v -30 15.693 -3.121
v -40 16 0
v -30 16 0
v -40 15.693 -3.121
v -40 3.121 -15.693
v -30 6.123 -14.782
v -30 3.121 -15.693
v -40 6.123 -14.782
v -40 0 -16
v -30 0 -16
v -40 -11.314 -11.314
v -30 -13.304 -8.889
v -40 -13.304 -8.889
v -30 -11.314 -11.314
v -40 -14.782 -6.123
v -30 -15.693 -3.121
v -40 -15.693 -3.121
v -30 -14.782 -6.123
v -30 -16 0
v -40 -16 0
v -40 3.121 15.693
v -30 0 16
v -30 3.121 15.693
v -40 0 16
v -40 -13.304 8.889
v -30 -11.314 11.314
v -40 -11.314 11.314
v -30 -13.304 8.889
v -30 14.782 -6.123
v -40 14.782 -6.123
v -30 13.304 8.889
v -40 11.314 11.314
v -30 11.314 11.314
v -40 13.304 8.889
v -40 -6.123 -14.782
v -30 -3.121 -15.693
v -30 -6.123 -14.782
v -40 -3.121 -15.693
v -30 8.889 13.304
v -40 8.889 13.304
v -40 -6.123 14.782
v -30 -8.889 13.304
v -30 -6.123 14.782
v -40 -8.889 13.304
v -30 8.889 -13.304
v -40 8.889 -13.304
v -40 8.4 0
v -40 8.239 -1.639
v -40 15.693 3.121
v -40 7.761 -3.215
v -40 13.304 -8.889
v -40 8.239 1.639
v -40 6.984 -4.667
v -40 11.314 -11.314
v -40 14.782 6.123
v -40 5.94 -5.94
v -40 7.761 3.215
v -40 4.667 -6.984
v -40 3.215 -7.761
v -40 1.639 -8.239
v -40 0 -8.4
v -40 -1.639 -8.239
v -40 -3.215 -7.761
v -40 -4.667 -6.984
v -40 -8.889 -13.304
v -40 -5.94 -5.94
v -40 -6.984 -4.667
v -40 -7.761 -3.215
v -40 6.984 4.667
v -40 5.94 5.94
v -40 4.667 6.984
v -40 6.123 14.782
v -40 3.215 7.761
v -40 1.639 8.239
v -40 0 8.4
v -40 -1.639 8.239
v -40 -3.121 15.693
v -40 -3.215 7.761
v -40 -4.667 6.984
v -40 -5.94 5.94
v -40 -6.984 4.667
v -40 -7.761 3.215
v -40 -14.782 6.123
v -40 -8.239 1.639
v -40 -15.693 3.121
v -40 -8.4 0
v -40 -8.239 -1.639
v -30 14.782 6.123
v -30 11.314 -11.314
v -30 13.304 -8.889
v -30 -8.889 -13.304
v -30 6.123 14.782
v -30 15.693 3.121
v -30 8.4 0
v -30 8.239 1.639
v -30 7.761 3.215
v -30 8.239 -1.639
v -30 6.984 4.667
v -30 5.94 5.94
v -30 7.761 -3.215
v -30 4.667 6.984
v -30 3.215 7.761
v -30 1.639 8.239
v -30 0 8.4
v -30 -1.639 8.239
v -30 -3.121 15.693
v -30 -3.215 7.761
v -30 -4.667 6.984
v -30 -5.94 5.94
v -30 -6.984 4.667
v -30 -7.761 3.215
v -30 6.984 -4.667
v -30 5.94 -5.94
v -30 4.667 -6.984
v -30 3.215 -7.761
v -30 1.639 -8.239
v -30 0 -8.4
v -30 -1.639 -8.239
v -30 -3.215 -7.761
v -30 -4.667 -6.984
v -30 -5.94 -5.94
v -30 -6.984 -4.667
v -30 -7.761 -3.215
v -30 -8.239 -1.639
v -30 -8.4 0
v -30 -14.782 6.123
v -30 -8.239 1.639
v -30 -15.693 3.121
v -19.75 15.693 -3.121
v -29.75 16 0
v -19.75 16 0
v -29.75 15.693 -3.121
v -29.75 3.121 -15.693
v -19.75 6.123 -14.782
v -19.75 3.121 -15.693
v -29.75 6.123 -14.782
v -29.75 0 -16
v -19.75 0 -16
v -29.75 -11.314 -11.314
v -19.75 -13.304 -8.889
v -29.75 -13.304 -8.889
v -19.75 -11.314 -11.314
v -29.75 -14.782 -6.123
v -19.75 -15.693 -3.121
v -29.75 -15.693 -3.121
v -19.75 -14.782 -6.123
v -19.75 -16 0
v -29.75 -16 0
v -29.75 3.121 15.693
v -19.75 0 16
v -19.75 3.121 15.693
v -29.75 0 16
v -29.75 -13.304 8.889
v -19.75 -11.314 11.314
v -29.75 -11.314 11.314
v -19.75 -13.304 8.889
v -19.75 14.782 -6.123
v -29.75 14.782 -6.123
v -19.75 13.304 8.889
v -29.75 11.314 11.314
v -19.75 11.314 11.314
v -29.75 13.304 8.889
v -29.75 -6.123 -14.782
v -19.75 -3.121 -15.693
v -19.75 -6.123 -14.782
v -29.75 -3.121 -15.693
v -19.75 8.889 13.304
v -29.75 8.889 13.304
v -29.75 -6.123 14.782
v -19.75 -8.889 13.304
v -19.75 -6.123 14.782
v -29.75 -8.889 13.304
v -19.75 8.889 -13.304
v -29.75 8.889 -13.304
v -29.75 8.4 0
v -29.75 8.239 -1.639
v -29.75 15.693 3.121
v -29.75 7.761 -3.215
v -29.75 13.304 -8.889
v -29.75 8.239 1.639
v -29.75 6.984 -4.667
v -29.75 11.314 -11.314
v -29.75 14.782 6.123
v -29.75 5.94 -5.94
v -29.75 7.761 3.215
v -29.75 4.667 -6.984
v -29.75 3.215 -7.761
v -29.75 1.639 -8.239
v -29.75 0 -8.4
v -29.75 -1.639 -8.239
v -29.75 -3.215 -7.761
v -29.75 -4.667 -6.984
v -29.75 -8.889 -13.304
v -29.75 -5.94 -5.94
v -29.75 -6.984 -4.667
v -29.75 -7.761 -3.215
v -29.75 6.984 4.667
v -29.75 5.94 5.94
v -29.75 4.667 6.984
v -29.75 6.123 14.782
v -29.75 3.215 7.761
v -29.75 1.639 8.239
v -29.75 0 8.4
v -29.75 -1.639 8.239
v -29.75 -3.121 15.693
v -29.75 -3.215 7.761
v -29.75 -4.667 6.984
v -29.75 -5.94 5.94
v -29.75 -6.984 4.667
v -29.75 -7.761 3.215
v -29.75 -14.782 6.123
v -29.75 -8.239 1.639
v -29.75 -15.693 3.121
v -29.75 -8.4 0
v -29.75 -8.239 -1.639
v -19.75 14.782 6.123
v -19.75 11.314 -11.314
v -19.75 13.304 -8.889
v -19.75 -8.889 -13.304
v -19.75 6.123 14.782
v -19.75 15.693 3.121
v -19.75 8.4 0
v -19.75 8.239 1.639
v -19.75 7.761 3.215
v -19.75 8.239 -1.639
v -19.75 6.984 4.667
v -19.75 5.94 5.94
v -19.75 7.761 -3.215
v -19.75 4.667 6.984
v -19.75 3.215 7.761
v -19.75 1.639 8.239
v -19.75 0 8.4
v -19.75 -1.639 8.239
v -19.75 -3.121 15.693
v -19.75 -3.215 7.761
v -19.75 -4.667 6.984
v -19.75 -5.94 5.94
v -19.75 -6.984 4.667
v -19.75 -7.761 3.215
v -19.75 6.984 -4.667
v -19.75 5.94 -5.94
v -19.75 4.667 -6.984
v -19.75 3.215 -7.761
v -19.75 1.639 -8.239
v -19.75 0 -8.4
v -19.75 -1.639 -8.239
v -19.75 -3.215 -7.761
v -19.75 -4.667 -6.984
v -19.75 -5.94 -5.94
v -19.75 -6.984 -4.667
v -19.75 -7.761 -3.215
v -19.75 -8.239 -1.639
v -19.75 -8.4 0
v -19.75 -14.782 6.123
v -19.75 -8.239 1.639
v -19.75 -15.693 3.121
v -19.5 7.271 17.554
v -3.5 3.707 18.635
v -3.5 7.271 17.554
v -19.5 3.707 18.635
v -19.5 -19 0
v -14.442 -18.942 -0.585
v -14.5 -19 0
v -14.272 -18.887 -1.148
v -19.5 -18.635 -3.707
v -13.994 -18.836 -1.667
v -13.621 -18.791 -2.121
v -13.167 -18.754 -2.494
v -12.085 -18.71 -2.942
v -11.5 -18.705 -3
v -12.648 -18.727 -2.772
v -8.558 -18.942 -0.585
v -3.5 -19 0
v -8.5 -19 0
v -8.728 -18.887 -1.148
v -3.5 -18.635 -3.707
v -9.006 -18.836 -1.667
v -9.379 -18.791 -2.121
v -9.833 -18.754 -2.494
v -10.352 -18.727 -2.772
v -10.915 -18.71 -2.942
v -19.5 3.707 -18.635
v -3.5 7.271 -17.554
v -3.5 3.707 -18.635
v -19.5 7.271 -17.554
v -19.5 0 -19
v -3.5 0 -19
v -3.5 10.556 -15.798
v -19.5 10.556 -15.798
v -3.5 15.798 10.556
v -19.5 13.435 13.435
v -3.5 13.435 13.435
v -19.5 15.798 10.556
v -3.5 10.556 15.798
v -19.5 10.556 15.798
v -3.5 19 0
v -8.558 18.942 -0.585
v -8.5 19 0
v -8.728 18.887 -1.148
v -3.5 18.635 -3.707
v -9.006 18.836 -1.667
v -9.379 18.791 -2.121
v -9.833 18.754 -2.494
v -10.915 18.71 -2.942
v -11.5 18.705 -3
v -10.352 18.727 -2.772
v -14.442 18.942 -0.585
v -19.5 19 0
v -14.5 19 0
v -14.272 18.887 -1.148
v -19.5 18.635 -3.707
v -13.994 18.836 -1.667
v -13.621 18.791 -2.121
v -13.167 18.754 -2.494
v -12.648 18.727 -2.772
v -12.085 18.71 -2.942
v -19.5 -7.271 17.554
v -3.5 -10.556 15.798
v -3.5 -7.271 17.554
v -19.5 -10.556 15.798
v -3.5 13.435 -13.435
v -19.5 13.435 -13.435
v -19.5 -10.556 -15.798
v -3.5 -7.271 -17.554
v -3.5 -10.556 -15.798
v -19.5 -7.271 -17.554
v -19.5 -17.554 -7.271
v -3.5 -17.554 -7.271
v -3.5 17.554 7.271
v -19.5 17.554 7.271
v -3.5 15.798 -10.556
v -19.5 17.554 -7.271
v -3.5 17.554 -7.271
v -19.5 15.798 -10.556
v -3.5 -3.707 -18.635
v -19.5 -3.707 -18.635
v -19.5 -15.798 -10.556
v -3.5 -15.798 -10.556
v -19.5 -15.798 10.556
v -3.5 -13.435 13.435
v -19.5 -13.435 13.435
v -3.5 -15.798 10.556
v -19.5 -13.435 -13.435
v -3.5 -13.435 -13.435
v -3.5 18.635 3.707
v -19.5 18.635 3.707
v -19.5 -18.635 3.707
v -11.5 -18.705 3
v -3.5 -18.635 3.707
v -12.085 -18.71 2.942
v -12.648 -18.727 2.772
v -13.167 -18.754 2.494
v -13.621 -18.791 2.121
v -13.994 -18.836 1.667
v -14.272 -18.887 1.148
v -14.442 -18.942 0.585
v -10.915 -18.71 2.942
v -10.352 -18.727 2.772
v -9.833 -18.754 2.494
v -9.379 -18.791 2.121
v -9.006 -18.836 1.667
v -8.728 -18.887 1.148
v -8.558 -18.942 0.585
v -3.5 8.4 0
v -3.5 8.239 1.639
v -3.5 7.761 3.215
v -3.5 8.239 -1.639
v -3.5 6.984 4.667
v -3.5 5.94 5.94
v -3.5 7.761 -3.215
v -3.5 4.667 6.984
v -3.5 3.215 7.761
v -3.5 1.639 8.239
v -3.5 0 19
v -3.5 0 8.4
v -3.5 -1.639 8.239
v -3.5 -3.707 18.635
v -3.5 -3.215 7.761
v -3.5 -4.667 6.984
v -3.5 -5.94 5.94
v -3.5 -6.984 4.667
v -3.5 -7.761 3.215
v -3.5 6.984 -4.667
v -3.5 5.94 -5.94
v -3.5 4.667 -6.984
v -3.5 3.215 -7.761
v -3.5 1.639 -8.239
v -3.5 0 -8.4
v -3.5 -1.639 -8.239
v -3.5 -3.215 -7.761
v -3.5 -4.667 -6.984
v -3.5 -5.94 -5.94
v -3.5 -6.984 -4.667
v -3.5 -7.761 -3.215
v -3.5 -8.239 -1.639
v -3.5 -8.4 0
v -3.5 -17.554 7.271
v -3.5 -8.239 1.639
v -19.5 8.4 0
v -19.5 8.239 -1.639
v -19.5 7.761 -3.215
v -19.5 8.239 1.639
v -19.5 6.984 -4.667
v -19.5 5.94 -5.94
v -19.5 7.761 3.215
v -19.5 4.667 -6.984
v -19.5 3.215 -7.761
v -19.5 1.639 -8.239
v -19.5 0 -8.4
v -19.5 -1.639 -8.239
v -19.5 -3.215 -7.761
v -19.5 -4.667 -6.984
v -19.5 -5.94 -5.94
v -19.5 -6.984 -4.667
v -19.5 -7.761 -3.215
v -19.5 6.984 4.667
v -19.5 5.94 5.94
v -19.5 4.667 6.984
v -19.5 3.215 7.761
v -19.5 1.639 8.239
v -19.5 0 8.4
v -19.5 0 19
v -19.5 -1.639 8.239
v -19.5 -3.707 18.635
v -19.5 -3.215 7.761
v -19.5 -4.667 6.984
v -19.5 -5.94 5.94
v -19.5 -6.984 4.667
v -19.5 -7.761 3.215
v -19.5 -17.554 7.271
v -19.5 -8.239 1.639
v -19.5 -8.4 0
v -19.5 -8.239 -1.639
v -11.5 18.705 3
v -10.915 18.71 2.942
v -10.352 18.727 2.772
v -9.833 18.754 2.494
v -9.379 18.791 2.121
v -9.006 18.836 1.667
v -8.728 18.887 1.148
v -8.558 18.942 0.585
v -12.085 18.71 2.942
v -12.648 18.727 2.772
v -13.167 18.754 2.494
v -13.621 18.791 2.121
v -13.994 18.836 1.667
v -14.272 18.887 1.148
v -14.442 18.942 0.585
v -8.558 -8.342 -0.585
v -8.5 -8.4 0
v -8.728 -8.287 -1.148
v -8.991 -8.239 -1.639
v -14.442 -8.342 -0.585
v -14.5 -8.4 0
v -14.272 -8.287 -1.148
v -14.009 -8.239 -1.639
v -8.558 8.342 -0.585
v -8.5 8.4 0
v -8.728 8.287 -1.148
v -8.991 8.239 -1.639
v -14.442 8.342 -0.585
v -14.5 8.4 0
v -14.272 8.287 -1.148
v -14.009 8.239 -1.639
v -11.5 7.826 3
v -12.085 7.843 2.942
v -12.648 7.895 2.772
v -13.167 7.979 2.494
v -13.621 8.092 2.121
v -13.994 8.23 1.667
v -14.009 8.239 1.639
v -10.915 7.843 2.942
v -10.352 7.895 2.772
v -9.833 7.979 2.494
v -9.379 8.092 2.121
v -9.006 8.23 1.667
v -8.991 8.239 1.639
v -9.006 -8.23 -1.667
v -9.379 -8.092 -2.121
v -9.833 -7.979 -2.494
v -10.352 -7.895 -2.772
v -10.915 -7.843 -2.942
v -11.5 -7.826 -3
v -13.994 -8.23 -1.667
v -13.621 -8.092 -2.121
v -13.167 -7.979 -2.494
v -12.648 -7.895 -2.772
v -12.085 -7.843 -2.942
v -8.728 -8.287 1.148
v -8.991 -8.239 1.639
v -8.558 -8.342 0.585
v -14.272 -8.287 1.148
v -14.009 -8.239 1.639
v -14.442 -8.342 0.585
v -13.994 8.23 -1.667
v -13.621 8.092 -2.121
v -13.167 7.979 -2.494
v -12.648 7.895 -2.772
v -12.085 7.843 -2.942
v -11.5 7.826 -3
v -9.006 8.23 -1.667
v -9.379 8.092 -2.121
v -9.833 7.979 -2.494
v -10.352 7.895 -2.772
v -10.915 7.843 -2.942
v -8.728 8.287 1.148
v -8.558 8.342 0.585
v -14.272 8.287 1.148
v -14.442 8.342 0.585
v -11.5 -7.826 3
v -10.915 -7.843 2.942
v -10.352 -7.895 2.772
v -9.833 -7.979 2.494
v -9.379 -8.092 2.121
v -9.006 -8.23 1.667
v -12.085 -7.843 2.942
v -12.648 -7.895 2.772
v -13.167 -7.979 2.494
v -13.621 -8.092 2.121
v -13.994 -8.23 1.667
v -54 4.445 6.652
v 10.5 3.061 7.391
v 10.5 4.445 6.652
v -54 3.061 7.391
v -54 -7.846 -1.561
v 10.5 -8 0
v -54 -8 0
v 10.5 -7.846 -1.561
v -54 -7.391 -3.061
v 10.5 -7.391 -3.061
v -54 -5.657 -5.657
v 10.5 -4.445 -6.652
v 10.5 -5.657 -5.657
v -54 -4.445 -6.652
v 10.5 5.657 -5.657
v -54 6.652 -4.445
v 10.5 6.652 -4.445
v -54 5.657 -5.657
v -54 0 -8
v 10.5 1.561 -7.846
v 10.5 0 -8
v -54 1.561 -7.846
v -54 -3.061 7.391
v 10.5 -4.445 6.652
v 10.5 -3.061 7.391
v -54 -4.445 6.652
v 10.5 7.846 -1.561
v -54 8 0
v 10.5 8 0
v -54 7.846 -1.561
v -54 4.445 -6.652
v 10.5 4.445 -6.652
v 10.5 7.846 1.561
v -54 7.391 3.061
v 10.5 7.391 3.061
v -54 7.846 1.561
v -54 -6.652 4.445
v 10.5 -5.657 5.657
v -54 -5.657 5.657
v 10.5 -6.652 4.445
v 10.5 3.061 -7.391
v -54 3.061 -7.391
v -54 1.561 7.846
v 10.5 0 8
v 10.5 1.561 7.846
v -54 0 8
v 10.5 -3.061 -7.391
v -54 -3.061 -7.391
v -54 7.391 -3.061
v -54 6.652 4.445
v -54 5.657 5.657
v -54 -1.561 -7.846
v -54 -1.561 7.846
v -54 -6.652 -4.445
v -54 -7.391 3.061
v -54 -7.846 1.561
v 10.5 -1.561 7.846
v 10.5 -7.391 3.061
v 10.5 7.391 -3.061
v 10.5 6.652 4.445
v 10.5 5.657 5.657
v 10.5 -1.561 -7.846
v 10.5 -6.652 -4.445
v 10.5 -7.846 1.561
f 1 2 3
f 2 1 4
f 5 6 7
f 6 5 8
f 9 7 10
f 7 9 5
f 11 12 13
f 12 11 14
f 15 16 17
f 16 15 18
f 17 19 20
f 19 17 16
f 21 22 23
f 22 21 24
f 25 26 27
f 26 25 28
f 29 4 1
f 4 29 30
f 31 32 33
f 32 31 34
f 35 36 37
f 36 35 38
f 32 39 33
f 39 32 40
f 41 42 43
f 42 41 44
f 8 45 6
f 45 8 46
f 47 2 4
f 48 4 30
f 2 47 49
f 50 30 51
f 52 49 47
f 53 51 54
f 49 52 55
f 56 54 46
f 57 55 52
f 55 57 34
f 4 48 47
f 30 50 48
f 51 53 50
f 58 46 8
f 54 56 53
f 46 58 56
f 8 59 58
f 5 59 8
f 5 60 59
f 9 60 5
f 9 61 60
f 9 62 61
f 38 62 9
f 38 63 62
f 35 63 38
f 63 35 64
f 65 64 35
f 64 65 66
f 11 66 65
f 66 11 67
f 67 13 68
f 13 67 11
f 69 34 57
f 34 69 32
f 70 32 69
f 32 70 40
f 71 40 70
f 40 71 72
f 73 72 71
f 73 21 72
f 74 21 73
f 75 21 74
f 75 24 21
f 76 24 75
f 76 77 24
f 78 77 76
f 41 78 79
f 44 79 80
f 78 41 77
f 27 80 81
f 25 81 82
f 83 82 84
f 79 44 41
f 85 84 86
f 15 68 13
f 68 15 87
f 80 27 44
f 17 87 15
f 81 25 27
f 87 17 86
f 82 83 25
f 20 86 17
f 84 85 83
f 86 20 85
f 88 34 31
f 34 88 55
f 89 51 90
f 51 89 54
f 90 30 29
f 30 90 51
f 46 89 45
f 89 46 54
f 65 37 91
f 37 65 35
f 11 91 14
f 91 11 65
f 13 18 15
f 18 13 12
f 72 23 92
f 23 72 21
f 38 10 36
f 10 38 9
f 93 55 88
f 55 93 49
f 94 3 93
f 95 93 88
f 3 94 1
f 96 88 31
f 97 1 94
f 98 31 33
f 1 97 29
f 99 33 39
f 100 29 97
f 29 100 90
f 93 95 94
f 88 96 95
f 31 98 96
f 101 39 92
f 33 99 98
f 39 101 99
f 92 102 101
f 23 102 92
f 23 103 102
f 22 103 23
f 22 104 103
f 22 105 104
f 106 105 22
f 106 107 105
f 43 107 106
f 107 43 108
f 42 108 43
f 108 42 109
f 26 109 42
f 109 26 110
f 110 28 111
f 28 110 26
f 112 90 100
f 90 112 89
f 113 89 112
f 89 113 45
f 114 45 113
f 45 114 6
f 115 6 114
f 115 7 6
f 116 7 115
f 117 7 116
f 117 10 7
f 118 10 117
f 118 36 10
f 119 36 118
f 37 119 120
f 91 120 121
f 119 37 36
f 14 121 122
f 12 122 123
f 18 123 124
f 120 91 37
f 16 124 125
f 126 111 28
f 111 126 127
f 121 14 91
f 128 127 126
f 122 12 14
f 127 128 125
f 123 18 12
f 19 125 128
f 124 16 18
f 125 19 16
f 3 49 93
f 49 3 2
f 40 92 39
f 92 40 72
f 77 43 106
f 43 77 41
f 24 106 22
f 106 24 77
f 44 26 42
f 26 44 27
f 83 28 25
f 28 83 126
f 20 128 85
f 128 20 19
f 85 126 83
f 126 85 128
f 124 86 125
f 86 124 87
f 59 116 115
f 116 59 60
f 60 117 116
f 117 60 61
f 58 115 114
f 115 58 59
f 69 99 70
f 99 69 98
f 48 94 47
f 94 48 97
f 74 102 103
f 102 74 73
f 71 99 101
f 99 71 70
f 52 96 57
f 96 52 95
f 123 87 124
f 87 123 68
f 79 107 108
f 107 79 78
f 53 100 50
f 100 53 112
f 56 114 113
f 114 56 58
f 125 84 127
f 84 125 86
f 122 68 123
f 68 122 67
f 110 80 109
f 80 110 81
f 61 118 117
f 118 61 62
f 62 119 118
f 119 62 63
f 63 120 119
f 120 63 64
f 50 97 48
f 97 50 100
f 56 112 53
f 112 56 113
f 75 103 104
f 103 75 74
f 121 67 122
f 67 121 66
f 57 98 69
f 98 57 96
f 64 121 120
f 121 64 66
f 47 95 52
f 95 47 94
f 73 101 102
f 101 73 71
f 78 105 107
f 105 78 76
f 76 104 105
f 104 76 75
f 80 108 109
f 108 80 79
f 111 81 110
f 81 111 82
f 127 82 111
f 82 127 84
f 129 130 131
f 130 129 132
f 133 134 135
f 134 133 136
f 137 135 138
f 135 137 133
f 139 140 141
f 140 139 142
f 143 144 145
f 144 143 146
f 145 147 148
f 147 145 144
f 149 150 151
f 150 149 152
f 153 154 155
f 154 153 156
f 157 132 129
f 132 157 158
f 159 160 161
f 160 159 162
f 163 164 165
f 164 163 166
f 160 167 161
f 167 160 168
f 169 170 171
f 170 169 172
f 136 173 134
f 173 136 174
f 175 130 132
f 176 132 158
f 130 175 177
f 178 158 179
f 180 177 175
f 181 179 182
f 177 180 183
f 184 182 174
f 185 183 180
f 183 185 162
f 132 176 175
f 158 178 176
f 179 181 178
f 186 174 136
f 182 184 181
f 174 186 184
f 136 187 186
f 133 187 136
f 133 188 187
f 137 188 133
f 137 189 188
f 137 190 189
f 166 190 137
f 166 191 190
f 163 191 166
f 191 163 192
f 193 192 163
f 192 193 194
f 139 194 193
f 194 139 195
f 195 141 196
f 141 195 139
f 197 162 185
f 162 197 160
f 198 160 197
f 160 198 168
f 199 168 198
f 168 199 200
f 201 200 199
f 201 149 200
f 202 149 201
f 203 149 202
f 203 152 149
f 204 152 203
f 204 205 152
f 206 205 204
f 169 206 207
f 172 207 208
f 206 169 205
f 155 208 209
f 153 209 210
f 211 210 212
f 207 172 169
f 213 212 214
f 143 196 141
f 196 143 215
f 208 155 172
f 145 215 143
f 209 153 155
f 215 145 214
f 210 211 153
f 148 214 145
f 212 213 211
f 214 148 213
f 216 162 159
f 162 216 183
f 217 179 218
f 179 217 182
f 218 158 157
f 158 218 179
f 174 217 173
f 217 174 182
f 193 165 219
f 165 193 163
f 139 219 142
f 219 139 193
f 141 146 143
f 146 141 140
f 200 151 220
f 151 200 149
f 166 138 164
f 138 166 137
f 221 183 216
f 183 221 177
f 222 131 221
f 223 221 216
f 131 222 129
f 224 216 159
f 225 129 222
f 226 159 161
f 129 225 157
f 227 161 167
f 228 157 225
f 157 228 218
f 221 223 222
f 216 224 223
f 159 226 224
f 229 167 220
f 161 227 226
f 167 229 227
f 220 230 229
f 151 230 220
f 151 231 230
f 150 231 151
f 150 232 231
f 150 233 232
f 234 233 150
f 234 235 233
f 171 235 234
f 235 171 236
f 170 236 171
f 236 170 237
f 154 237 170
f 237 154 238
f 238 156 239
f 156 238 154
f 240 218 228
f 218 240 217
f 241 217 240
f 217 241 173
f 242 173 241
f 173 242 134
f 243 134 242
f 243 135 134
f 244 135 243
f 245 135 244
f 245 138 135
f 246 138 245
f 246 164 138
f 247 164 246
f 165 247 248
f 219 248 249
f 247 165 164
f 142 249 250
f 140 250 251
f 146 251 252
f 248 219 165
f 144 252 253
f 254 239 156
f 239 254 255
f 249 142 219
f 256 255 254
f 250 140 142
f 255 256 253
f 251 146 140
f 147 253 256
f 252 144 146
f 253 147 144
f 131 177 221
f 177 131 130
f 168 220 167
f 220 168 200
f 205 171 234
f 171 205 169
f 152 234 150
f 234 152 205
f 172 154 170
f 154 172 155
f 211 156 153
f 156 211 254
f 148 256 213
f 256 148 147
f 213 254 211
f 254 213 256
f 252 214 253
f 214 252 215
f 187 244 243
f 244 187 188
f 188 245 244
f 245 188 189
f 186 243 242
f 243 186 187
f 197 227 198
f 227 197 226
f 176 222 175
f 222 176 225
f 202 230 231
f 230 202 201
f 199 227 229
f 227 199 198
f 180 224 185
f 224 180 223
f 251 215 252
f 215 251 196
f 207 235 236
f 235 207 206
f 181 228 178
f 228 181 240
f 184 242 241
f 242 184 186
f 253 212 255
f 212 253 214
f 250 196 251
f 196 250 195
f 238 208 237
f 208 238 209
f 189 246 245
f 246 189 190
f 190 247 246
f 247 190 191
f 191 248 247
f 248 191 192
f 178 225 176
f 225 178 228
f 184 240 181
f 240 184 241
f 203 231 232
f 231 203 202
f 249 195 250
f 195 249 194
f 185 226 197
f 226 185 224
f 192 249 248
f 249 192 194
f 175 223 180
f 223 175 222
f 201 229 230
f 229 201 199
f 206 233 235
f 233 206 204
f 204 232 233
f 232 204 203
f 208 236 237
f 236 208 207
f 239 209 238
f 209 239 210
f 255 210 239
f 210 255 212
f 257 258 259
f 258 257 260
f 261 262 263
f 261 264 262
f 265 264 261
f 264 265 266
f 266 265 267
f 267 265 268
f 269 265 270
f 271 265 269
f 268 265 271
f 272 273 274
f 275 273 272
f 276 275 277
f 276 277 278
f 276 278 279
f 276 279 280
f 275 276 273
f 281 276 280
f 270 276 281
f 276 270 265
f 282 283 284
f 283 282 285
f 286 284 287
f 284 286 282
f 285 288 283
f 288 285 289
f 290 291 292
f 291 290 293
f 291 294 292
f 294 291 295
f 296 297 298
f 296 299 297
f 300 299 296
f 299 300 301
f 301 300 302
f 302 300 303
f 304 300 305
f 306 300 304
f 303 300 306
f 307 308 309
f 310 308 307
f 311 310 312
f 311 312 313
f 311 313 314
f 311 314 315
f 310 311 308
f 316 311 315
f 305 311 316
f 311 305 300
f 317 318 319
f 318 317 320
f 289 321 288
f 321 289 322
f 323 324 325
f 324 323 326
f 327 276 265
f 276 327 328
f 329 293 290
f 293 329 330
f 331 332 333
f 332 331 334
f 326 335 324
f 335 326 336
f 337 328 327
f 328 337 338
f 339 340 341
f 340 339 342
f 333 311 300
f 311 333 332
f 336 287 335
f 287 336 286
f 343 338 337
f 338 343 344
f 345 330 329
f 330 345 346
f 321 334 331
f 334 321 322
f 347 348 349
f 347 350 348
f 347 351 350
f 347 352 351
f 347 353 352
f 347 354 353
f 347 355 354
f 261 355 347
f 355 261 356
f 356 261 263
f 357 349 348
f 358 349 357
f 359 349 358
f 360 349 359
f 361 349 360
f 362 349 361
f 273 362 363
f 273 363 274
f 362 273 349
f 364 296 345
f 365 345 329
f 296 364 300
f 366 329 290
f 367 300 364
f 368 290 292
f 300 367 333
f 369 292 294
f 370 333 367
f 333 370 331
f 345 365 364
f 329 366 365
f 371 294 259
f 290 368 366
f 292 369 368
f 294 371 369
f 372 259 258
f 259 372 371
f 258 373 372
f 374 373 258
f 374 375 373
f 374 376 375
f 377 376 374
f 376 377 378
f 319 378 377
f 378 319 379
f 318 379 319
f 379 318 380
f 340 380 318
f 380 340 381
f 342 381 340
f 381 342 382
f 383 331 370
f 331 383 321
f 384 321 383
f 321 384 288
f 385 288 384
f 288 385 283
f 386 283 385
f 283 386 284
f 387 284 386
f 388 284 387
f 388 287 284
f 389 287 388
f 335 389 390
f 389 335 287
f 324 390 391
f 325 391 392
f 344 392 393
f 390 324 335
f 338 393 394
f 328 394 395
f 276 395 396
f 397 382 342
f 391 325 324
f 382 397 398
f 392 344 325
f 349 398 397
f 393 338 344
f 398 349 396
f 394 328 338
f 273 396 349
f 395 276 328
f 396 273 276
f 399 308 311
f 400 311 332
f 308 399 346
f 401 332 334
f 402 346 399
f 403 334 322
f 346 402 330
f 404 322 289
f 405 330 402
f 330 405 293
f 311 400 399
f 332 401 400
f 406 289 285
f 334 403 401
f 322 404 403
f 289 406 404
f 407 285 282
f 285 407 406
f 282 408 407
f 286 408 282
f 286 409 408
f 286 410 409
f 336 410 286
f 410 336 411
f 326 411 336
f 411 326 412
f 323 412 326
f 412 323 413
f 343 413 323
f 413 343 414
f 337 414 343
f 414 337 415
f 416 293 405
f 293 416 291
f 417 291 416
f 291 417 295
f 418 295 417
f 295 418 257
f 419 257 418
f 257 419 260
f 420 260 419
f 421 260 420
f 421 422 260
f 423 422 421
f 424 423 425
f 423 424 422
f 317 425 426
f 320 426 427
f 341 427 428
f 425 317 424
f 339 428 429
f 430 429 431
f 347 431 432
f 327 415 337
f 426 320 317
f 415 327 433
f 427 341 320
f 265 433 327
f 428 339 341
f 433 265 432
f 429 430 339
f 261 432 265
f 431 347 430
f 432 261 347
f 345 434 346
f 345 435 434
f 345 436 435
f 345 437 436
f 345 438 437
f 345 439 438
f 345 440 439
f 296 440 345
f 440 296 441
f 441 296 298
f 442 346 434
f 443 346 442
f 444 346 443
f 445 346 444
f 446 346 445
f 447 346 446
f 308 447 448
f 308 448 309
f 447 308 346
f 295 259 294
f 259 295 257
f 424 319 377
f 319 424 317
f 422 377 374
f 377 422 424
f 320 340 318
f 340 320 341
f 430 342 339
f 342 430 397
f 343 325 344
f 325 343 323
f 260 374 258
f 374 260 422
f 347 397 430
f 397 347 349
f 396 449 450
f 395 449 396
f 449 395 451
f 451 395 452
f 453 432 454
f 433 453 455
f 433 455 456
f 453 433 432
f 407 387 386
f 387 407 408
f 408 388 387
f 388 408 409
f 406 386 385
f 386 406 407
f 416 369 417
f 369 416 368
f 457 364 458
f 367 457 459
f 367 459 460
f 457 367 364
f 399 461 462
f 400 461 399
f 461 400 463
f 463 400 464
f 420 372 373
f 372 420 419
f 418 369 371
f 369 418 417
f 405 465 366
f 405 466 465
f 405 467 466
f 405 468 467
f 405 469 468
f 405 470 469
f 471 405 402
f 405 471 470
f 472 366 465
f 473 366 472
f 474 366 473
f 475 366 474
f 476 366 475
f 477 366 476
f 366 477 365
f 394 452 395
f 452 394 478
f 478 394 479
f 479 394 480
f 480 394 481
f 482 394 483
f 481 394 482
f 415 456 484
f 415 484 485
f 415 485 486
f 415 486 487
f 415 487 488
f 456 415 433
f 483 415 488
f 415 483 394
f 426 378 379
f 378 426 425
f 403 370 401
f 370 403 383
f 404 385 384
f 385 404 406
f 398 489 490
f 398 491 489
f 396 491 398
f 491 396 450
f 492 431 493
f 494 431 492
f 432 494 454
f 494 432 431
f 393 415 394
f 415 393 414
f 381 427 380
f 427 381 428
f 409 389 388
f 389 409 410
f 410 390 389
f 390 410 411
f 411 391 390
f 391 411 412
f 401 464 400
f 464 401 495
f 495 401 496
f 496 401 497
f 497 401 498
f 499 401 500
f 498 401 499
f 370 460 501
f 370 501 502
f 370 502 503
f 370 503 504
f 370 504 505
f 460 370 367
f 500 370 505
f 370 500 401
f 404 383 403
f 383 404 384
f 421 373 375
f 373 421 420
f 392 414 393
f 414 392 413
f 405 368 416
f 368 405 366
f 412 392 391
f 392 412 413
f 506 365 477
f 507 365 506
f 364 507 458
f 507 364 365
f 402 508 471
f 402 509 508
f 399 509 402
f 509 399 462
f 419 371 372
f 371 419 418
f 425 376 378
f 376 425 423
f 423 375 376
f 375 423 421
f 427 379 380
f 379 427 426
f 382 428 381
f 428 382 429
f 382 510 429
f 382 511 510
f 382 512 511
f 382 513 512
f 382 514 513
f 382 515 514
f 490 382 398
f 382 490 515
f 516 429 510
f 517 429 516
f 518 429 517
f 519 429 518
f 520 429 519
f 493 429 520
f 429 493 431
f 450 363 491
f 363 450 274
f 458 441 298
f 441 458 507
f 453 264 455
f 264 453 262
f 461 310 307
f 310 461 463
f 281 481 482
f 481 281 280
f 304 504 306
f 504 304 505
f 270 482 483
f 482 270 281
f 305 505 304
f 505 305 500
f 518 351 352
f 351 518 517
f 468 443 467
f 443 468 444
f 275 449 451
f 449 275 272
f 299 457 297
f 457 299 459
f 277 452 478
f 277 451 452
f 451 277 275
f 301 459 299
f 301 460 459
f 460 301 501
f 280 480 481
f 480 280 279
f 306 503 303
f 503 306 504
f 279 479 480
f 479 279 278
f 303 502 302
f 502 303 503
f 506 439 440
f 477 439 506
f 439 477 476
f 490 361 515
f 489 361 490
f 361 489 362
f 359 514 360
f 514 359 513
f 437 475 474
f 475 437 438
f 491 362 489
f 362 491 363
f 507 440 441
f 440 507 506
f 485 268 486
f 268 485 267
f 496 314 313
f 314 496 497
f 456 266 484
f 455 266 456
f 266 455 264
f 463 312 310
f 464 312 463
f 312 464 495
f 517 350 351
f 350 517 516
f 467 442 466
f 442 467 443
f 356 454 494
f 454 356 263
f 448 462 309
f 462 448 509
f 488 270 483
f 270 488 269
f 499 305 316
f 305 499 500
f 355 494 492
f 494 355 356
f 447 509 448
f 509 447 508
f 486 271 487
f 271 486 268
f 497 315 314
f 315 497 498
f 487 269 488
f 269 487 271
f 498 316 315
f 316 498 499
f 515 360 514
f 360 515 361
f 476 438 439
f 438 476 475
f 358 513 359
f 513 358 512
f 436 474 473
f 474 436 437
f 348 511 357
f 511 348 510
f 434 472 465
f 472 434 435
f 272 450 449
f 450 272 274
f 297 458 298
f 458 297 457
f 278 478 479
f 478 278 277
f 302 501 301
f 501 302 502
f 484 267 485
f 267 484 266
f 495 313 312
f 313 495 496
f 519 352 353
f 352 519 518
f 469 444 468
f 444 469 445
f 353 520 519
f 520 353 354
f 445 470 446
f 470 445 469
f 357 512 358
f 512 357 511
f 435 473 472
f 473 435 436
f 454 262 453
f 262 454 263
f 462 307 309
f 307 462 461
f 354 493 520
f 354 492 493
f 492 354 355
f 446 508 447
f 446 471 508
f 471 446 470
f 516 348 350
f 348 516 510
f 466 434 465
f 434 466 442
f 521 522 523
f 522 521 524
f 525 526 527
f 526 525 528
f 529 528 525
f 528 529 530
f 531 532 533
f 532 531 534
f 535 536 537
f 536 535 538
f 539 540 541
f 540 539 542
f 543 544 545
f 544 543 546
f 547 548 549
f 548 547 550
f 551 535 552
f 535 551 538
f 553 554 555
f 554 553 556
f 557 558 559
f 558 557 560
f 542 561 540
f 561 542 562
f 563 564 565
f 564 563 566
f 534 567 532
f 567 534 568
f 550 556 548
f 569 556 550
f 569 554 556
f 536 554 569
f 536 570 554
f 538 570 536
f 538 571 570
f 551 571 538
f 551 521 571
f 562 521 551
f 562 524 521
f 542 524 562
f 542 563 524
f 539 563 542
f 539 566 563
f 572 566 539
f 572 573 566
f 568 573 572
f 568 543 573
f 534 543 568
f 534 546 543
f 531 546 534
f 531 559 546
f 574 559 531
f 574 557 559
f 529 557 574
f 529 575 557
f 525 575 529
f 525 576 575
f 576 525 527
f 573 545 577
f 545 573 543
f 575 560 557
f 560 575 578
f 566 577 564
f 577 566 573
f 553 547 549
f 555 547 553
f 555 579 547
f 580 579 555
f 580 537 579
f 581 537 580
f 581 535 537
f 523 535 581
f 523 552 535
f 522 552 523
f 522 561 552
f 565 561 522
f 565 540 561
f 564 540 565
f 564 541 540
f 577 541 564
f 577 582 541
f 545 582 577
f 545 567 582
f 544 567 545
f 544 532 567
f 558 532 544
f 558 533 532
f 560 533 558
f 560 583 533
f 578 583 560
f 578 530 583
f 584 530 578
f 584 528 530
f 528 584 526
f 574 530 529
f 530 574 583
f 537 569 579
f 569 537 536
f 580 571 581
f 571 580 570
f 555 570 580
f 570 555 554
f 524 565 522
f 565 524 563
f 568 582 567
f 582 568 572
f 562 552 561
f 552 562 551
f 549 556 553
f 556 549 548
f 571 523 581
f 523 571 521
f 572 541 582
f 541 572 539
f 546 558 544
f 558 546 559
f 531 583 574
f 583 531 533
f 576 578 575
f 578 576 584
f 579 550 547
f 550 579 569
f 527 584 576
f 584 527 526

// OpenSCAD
$fn = 32;

// ------------------------------------------------------------------------
// Shaft with rings and collars: d16 shaft, 3 rings
// Every part is its own module, assembly() places them once.
// ------------------------------------------------------------------------

// --- part 1 ---
module shaft() {
  translate([0, 0, -32.25]) cylinder(h = 64.5, d = 16);
}

// --- part 2 ---
module spacer_a() {
  difference() {
      translate([0, 0, 0]) cylinder(h = 10, d = 32);
      translate([0, 0, -1]) cylinder(h = 12, d = 16.8);
    }
}

// --- part 3 ---
module spacer_b() {
  difference() {
      translate([0, 0, 0]) cylinder(h = 10, d = 32);
      translate([0, 0, -1]) cylinder(h = 12, d = 16.8);
    }
}

// --- part 4 ---
module collar_a() {
  difference() {
    cylinder(h = 16, d = 38);
    translate([0, 0, -1]) cylinder(h = 18, d = 16.8);
    translate([0, 0, 8]) rotate([90, 0, 0]) cylinder(h = 40, d = 6, center = true);
  }
}

// --- assembly ---
module assembly() {
  translate([-21.75, 0, 0]) rotate([0, 90, 0]) shaft();
  translate([-40, 0, 0]) rotate([0, 90, 0]) spacer_a();
  translate([-29.75, 0, 0]) rotate([0, 90, 0]) spacer_b();
  translate([-19.5, 0, 0]) rotate([0, 90, 0]) collar_a();
}

assembly();
